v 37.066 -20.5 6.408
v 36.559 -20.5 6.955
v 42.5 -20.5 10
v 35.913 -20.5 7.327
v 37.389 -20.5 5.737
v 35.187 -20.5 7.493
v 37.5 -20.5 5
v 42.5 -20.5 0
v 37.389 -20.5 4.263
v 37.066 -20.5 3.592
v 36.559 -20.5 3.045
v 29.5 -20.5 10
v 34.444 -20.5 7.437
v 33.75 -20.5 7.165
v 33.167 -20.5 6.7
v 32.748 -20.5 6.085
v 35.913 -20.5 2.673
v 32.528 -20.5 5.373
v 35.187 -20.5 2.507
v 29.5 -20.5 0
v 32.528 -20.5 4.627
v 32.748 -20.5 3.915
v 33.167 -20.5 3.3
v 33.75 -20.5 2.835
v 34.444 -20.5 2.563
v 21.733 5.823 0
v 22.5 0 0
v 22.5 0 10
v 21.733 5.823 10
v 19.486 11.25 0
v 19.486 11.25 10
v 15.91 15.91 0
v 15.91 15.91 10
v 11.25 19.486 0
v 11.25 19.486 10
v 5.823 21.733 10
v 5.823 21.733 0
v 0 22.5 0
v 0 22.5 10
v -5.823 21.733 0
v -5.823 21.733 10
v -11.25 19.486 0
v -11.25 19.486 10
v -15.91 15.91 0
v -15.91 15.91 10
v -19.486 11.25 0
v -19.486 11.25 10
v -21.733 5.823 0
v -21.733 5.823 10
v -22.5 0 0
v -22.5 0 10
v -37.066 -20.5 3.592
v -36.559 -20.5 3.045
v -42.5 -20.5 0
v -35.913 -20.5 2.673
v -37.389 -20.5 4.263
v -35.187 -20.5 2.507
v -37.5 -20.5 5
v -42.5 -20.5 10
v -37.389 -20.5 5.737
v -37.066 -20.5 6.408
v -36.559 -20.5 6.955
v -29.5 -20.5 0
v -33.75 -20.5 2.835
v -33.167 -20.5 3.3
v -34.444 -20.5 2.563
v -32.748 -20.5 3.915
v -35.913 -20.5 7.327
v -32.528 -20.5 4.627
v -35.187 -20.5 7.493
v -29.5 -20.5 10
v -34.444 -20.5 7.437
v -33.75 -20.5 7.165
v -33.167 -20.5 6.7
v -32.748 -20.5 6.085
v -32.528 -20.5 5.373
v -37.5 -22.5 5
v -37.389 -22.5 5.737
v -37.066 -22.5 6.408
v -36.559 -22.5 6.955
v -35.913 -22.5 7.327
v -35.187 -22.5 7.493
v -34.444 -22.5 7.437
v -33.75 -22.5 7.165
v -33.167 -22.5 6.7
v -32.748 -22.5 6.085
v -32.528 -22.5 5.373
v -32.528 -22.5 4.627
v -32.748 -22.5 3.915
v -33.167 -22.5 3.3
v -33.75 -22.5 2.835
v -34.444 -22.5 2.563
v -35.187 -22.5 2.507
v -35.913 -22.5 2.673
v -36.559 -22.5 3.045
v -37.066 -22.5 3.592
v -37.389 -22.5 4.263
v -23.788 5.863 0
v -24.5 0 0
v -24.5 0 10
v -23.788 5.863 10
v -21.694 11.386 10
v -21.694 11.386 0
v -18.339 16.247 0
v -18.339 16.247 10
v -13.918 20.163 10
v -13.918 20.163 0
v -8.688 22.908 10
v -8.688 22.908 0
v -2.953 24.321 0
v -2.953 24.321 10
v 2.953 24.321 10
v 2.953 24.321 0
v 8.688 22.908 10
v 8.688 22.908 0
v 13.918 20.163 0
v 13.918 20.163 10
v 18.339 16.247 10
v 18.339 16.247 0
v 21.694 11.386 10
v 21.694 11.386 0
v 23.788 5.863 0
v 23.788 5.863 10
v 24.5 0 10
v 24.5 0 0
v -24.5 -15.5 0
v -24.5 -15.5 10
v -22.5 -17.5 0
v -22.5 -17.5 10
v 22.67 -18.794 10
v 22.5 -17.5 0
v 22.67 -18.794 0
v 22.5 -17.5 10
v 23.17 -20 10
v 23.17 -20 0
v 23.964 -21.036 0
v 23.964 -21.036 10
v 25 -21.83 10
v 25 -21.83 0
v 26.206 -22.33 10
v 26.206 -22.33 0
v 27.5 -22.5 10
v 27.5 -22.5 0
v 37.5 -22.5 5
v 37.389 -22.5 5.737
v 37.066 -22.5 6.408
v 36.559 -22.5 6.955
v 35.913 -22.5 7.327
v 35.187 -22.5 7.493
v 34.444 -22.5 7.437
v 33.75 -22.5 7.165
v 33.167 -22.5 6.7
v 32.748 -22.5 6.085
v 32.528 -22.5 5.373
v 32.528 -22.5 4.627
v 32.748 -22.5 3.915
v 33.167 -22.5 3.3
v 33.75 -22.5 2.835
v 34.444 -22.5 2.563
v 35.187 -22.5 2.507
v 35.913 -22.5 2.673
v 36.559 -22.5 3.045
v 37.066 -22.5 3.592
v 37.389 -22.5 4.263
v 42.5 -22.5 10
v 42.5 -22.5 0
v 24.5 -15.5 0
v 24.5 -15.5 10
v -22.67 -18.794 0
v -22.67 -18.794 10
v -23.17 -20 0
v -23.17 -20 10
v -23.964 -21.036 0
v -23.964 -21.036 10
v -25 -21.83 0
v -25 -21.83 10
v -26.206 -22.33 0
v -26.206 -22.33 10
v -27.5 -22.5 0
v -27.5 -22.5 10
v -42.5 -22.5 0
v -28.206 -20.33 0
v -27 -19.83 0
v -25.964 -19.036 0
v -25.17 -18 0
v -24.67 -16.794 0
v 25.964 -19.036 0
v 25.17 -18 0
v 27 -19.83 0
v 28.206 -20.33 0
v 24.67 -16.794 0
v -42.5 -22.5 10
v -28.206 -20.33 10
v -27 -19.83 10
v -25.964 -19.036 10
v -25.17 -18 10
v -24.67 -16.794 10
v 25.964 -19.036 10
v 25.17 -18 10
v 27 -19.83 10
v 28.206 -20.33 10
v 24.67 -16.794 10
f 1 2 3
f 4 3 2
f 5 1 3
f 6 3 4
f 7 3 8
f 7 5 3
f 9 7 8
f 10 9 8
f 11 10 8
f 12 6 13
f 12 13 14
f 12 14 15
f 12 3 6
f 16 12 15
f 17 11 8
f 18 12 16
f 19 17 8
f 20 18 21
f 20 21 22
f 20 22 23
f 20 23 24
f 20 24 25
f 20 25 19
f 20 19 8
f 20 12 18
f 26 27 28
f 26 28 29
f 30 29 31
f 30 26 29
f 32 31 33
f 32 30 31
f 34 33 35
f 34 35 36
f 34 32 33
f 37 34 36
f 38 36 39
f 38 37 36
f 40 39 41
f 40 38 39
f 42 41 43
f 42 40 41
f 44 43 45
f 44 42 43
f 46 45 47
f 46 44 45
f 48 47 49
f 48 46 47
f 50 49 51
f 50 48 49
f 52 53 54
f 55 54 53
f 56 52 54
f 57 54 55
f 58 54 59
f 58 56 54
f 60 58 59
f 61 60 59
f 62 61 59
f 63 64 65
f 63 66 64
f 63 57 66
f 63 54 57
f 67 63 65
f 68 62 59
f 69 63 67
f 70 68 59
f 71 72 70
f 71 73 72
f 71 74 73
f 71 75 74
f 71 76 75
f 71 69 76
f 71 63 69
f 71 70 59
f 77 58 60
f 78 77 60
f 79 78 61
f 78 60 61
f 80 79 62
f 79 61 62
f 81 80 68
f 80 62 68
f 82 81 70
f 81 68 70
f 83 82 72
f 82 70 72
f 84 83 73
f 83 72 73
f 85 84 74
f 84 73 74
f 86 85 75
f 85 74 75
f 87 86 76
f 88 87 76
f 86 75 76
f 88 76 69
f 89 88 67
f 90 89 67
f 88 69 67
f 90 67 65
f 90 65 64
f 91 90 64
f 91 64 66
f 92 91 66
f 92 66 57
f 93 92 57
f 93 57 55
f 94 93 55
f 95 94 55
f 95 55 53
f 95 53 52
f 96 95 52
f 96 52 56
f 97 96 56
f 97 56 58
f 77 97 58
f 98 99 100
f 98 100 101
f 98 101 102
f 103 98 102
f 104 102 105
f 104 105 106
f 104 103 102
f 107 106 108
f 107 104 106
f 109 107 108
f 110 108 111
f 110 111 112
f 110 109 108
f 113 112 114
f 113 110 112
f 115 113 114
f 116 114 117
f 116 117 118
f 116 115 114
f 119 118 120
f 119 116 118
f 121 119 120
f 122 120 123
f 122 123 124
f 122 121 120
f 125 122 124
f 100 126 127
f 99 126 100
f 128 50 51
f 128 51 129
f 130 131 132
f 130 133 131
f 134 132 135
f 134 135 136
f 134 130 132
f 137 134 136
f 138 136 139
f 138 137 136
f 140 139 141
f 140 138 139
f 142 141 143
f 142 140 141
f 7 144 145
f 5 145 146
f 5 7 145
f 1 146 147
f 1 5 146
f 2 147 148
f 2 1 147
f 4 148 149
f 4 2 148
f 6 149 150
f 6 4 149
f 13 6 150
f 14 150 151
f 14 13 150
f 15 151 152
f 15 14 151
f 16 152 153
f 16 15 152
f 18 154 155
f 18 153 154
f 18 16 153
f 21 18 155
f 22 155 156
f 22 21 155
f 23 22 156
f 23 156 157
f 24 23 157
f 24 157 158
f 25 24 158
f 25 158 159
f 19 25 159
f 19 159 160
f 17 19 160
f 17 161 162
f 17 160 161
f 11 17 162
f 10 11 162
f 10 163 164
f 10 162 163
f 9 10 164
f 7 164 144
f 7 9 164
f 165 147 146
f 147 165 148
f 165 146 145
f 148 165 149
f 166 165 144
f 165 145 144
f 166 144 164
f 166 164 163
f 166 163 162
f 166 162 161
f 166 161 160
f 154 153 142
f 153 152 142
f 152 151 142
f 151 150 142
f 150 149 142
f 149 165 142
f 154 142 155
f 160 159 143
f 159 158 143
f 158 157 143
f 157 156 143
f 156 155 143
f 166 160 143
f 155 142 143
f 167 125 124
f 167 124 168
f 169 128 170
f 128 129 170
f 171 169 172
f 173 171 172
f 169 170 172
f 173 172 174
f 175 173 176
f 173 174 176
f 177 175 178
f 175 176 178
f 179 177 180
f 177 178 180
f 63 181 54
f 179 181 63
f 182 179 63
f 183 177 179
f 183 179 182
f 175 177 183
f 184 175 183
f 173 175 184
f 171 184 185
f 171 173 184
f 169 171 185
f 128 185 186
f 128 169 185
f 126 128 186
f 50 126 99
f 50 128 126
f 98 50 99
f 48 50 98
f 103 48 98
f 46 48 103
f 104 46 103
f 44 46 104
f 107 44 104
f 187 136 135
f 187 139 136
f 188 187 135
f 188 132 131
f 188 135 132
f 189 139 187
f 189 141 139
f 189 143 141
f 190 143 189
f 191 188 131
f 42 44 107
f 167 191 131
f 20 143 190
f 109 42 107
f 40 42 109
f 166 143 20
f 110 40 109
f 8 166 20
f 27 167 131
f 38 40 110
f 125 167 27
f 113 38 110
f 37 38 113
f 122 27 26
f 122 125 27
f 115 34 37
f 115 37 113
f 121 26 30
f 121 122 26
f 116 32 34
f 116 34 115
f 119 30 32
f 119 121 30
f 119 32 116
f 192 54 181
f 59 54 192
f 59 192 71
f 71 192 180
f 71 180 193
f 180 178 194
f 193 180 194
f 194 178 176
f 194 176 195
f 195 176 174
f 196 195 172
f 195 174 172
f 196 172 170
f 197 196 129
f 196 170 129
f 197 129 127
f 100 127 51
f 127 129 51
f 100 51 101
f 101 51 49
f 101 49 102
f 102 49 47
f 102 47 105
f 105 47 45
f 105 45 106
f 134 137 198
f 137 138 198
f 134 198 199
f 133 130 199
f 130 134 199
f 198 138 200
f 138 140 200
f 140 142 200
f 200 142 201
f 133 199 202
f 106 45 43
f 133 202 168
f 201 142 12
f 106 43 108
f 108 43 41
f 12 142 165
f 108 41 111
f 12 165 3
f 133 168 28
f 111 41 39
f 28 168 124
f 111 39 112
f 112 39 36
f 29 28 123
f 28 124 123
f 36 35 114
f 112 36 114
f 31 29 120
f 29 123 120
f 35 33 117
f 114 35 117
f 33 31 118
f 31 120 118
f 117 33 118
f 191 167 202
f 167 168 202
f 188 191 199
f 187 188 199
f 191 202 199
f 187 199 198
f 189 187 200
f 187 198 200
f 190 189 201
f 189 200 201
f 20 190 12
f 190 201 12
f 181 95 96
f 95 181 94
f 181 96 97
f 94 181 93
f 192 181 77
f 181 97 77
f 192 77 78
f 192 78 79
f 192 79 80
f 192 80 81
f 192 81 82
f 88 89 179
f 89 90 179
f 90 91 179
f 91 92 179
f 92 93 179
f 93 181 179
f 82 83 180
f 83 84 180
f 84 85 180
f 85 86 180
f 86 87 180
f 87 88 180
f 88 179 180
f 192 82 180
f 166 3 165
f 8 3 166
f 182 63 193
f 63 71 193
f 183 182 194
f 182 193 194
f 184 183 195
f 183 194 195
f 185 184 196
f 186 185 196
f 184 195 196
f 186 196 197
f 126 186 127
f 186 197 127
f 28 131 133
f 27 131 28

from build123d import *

# Parameters (mm, degrees)
BOSS_EXTRUDE1_DEPTH = 10
FILLET11_R          = 5
FILLET12_R          = 5
FILLET13_R          = 5
SKETCH7_W           = 10
SKETCH7_H           = 2
BOSS_EXTRUDE5_DEPTH = 10
SKETCH8_W           = 10
SKETCH8_H           = 2
BOSS_EXTRUDE6_DEPTH = 10
SKETCH9_R           = 2.5
CUT_EXTRUDE2_DEPTH  = 10


with BuildPart() as part:
    # Sketch2 → Boss-Extrude1 (new body)
    with BuildSketch(Plane.XY):
        with BuildLine():
            Line((24.5, -20.5), (32.5, -20.5))
            Line((32.5, -20.5), (32.5, -22.5))
            Line((32.5, -22.5), (22.5, -22.5))
            Line((22.5, -22.5), (22.5, 0))
            ThreePointArc((22.5, 0), (0, 22.5), (-22.5, 0))
            Line((-22.5, 0), (-22.5, -22.5))
            Line((-22.5, -22.5), (-32.5, -22.5))
            Line((-32.5, -22.5), (-32.5, -20.5))
            Line((-32.5, -20.5), (-24.5, -20.5))
            Line((-24.5, -20.5), (-24.5, 0))
            ThreePointArc((-24.5, 0), (0, 24.5), (24.5, 0))
            Line((24.5, 0), (24.5, -20.5))
        make_face()
    extrude(amount=BOSS_EXTRUDE1_DEPTH)

    # Fillet11
    fillet11_edges = [part.edges().sort_by_distance(p)[0] for p in [
        (-22.5, -22.5, 5),
    ]]
    fillet(fillet11_edges, radius=FILLET11_R)

    # Fillet12
    fillet12_edges = [part.edges().sort_by_distance(p)[0] for p in [
        (-24.5, -20.5, 5),
    ]]
    fillet(fillet12_edges, radius=FILLET12_R)

    # Fillet13
    fillet13_edges = [part.edges().sort_by_distance(p)[0] for p in [
        (24.5, -20.5, 5),
        (22.5, -22.5, 5),
    ]]
    fillet(fillet13_edges, radius=FILLET13_R)

    # Sketch7 → Boss-Extrude5 (add)
    with BuildSketch(Plane(origin=(32.5, 0, 0), x_dir=(0, 0, -1), z_dir=(1, 0, 0))):
        with Locations((-5, -21.5)):
            Rectangle(SKETCH7_W, SKETCH7_H)
    extrude(amount=BOSS_EXTRUDE5_DEPTH)

    # Sketch8 → Boss-Extrude6 (add)
    with BuildSketch(Plane.ZY.offset(32.5)):
        with Locations((5, -21.5)):
            Rectangle(SKETCH8_W, SKETCH8_H)
    extrude(amount=BOSS_EXTRUDE6_DEPTH)

    # Sketch9 → Cut-Extrude2 (cut)
    with BuildSketch(Plane(origin=(0, -20.5, 0), x_dir=(1, 0, 0), z_dir=(0, 1, 0))):
        with Locations(Location((-35, -5, 0), (0, 0, 180))):
            Circle(SKETCH9_R)
    cut_extrude2 = extrude(amount=-CUT_EXTRUDE2_DEPTH, mode=Mode.SUBTRACT)

    # Mirror2: Cut-Extrude2 across plane
    add(cut_extrude2.mirror(Plane(origin=(0, 0, 0), x_dir=(0, 0, 1), z_dir=(1, 0, 0))), mode=Mode.SUBTRACT)


solid = part.part
